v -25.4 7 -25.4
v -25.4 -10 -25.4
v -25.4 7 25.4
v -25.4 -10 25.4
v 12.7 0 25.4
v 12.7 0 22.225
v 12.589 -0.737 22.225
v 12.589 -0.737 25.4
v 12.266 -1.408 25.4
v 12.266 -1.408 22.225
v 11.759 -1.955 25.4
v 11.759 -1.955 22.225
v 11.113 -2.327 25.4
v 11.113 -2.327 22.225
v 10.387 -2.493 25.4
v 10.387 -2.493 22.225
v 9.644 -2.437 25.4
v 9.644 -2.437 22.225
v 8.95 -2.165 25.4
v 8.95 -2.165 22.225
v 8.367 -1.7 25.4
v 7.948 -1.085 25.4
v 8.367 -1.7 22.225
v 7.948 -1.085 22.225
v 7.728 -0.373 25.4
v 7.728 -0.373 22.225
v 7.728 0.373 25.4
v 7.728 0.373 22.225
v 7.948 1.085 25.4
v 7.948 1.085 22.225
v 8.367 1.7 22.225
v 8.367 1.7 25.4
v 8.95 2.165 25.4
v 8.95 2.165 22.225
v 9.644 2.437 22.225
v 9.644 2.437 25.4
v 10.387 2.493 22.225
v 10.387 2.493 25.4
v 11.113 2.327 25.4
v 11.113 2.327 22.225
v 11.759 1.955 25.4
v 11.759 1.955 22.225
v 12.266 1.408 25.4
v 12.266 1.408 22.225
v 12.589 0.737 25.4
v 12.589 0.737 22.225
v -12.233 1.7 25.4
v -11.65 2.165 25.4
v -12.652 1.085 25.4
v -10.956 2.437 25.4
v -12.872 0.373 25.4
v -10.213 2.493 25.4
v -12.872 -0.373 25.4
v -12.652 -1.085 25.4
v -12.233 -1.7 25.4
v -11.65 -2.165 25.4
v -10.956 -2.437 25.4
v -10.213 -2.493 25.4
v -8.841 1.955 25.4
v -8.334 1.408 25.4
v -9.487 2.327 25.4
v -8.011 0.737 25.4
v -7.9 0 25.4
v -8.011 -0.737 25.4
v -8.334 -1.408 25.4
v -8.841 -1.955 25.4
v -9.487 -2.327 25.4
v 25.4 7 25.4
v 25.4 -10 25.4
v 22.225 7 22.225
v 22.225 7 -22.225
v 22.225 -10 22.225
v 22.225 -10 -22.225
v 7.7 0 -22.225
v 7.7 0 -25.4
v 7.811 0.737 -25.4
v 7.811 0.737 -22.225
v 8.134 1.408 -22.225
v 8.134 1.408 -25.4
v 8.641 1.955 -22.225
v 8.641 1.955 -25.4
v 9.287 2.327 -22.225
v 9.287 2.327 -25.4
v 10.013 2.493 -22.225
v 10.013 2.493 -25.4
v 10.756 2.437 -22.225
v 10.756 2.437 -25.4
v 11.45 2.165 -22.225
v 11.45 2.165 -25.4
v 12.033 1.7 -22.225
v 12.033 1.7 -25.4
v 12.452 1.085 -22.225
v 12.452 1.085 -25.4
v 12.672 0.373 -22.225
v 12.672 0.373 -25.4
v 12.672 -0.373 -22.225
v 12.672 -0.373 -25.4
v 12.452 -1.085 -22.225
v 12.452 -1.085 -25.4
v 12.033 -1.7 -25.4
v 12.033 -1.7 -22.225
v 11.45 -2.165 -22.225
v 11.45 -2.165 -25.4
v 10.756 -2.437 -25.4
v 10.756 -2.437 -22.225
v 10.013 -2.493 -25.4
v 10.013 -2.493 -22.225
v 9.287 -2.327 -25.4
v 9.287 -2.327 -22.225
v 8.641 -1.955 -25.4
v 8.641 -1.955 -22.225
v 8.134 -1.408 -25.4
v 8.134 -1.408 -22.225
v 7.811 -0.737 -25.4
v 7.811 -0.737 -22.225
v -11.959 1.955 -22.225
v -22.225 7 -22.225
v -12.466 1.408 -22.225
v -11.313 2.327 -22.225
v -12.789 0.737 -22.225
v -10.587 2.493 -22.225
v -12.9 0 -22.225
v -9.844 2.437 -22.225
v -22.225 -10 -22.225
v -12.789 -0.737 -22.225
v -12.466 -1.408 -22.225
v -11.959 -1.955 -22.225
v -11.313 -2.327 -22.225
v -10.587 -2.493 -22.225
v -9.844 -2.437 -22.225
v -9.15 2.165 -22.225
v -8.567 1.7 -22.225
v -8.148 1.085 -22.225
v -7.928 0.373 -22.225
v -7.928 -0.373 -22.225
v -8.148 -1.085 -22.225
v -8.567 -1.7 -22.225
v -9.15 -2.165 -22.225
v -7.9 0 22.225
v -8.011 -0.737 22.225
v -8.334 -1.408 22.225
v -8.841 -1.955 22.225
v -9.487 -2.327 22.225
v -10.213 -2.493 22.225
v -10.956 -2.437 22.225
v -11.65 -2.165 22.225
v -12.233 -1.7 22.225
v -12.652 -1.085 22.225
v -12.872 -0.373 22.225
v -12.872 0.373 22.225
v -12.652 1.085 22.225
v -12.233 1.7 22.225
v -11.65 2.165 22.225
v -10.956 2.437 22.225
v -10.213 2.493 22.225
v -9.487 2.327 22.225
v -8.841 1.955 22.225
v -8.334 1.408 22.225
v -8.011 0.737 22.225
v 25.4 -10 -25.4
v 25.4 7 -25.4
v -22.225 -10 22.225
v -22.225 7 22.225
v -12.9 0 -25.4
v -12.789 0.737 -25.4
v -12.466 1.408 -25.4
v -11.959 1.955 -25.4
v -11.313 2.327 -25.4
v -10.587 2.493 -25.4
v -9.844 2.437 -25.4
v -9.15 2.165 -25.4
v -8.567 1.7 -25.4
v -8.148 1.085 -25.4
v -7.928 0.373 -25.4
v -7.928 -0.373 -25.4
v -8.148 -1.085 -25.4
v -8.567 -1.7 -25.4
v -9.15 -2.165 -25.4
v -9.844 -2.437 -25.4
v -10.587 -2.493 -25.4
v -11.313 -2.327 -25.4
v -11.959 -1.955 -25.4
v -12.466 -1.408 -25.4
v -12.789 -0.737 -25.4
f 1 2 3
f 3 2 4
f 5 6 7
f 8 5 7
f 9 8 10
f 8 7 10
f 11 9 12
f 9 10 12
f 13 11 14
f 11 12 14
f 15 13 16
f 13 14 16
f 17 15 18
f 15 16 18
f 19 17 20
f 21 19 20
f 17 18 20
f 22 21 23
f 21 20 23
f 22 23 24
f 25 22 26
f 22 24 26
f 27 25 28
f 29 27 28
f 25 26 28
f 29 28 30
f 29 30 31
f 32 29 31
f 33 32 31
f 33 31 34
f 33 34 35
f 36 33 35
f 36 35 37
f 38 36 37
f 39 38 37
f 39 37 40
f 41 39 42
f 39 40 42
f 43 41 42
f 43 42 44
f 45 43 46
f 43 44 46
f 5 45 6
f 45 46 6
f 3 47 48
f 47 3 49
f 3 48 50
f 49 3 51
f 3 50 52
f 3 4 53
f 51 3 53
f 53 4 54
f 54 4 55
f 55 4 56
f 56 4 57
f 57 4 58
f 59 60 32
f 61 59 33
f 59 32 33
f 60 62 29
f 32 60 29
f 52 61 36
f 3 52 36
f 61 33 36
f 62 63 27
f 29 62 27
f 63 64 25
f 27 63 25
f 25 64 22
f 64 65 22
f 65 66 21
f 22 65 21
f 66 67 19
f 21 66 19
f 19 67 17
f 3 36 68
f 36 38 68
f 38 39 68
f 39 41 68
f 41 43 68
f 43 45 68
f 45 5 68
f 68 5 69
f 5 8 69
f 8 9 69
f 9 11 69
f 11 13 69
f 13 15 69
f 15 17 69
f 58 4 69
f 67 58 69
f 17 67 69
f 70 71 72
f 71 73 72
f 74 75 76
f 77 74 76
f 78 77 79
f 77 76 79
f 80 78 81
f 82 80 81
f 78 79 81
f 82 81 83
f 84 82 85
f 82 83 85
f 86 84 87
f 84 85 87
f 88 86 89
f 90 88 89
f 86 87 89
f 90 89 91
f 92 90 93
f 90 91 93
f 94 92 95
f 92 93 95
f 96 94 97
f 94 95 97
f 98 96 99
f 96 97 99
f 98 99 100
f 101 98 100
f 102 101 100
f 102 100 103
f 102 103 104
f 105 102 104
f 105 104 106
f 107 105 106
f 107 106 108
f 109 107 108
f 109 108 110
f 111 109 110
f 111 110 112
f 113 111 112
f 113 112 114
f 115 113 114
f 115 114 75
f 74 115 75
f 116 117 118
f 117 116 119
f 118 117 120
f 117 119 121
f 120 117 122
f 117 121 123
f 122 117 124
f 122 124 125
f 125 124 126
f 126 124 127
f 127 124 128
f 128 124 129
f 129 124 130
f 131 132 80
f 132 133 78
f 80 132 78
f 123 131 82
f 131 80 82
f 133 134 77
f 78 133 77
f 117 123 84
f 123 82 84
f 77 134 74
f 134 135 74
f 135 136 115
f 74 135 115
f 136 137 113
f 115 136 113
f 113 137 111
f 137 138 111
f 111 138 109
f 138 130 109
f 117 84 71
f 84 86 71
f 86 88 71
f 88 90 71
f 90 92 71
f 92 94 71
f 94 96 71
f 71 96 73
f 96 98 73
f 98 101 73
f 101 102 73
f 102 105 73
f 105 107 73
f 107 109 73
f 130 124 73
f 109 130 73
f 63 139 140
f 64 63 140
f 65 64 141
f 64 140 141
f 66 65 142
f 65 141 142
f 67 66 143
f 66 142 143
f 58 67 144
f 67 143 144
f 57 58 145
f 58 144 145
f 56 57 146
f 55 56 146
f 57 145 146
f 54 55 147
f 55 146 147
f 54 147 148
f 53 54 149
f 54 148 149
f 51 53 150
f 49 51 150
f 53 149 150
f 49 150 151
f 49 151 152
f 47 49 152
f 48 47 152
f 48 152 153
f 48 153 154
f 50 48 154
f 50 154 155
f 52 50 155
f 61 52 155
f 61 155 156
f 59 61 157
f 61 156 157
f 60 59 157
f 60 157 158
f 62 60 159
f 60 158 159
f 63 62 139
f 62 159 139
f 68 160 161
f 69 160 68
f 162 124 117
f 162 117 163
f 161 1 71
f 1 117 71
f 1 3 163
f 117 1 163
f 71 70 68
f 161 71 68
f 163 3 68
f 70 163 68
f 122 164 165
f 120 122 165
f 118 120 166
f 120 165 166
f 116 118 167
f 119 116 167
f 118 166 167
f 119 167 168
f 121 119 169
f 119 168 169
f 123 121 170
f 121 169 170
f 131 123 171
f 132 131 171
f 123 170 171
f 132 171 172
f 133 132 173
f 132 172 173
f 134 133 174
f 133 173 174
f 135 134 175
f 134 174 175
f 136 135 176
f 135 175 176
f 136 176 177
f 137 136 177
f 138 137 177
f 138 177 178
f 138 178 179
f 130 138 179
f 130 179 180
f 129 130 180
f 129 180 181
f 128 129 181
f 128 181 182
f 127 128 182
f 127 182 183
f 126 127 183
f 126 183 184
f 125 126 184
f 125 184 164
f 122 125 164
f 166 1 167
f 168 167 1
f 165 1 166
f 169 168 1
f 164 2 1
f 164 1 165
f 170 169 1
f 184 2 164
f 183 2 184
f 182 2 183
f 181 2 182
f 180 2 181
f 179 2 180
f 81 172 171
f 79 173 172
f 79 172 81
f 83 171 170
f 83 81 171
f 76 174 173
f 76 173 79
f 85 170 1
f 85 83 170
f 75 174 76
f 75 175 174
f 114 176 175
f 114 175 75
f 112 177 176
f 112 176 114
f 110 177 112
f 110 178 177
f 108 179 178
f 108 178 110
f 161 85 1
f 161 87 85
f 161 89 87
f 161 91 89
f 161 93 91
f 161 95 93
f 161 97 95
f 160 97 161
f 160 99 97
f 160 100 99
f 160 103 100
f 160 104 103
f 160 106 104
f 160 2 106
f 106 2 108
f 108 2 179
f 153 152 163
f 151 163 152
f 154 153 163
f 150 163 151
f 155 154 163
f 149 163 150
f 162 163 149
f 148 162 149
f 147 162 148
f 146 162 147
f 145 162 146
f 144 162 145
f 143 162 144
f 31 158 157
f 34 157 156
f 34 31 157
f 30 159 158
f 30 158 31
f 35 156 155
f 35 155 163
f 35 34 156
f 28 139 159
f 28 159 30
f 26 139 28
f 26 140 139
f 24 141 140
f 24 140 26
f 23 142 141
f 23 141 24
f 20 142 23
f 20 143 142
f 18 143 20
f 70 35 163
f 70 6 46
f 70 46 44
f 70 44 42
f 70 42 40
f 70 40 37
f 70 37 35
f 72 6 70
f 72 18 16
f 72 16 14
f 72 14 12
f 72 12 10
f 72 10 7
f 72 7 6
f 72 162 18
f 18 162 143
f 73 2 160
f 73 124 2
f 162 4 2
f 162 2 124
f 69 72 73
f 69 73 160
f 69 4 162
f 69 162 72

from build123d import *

# Parameters (mm, degrees)
F0_W          = 50.8
F0_H          = 50.8
F0_W_2        = 44.45
F0_H_2        = 44.45
F1_DEPTH      = 10
F1_DEPTH_BACK = 7
F3_D          = 5
F3_DEPTH      = 25.401
F4_D          = 5


# Not quite as in the source:
# - a feature names something its author has since deleted; it is built from what else it names


with BuildPart() as f1:
    # F0 (on Front) → F1 (new body, two sides)
    with BuildSketch(Plane.XZ) as f1_sk:
        Rectangle(F0_W, F0_H)
        Rectangle(F0_W_2, F0_H_2, mode=Mode.SUBTRACT)
    extrude(amount=F1_DEPTH)
    extrude(f1_sk.sketch, amount=-F1_DEPTH_BACK)

    # F3 (through all, one way)
    with BuildSketch(Plane(origin=(0, 0, 0), x_dir=(1, 0, 0), z_dir=(0, 0, -1))):
        with Locations((-10.4, 0), (10.2, 0)):
            Circle(F3_D / 2)
    extrude(amount=-F3_DEPTH, mode=Mode.SUBTRACT)

    # F4 (through all)
    with Locations(Plane.XY):
        with Locations((-10.4, 0), (10.2, 0)):
            Hole(F4_D / 2)


solid = f1.part
